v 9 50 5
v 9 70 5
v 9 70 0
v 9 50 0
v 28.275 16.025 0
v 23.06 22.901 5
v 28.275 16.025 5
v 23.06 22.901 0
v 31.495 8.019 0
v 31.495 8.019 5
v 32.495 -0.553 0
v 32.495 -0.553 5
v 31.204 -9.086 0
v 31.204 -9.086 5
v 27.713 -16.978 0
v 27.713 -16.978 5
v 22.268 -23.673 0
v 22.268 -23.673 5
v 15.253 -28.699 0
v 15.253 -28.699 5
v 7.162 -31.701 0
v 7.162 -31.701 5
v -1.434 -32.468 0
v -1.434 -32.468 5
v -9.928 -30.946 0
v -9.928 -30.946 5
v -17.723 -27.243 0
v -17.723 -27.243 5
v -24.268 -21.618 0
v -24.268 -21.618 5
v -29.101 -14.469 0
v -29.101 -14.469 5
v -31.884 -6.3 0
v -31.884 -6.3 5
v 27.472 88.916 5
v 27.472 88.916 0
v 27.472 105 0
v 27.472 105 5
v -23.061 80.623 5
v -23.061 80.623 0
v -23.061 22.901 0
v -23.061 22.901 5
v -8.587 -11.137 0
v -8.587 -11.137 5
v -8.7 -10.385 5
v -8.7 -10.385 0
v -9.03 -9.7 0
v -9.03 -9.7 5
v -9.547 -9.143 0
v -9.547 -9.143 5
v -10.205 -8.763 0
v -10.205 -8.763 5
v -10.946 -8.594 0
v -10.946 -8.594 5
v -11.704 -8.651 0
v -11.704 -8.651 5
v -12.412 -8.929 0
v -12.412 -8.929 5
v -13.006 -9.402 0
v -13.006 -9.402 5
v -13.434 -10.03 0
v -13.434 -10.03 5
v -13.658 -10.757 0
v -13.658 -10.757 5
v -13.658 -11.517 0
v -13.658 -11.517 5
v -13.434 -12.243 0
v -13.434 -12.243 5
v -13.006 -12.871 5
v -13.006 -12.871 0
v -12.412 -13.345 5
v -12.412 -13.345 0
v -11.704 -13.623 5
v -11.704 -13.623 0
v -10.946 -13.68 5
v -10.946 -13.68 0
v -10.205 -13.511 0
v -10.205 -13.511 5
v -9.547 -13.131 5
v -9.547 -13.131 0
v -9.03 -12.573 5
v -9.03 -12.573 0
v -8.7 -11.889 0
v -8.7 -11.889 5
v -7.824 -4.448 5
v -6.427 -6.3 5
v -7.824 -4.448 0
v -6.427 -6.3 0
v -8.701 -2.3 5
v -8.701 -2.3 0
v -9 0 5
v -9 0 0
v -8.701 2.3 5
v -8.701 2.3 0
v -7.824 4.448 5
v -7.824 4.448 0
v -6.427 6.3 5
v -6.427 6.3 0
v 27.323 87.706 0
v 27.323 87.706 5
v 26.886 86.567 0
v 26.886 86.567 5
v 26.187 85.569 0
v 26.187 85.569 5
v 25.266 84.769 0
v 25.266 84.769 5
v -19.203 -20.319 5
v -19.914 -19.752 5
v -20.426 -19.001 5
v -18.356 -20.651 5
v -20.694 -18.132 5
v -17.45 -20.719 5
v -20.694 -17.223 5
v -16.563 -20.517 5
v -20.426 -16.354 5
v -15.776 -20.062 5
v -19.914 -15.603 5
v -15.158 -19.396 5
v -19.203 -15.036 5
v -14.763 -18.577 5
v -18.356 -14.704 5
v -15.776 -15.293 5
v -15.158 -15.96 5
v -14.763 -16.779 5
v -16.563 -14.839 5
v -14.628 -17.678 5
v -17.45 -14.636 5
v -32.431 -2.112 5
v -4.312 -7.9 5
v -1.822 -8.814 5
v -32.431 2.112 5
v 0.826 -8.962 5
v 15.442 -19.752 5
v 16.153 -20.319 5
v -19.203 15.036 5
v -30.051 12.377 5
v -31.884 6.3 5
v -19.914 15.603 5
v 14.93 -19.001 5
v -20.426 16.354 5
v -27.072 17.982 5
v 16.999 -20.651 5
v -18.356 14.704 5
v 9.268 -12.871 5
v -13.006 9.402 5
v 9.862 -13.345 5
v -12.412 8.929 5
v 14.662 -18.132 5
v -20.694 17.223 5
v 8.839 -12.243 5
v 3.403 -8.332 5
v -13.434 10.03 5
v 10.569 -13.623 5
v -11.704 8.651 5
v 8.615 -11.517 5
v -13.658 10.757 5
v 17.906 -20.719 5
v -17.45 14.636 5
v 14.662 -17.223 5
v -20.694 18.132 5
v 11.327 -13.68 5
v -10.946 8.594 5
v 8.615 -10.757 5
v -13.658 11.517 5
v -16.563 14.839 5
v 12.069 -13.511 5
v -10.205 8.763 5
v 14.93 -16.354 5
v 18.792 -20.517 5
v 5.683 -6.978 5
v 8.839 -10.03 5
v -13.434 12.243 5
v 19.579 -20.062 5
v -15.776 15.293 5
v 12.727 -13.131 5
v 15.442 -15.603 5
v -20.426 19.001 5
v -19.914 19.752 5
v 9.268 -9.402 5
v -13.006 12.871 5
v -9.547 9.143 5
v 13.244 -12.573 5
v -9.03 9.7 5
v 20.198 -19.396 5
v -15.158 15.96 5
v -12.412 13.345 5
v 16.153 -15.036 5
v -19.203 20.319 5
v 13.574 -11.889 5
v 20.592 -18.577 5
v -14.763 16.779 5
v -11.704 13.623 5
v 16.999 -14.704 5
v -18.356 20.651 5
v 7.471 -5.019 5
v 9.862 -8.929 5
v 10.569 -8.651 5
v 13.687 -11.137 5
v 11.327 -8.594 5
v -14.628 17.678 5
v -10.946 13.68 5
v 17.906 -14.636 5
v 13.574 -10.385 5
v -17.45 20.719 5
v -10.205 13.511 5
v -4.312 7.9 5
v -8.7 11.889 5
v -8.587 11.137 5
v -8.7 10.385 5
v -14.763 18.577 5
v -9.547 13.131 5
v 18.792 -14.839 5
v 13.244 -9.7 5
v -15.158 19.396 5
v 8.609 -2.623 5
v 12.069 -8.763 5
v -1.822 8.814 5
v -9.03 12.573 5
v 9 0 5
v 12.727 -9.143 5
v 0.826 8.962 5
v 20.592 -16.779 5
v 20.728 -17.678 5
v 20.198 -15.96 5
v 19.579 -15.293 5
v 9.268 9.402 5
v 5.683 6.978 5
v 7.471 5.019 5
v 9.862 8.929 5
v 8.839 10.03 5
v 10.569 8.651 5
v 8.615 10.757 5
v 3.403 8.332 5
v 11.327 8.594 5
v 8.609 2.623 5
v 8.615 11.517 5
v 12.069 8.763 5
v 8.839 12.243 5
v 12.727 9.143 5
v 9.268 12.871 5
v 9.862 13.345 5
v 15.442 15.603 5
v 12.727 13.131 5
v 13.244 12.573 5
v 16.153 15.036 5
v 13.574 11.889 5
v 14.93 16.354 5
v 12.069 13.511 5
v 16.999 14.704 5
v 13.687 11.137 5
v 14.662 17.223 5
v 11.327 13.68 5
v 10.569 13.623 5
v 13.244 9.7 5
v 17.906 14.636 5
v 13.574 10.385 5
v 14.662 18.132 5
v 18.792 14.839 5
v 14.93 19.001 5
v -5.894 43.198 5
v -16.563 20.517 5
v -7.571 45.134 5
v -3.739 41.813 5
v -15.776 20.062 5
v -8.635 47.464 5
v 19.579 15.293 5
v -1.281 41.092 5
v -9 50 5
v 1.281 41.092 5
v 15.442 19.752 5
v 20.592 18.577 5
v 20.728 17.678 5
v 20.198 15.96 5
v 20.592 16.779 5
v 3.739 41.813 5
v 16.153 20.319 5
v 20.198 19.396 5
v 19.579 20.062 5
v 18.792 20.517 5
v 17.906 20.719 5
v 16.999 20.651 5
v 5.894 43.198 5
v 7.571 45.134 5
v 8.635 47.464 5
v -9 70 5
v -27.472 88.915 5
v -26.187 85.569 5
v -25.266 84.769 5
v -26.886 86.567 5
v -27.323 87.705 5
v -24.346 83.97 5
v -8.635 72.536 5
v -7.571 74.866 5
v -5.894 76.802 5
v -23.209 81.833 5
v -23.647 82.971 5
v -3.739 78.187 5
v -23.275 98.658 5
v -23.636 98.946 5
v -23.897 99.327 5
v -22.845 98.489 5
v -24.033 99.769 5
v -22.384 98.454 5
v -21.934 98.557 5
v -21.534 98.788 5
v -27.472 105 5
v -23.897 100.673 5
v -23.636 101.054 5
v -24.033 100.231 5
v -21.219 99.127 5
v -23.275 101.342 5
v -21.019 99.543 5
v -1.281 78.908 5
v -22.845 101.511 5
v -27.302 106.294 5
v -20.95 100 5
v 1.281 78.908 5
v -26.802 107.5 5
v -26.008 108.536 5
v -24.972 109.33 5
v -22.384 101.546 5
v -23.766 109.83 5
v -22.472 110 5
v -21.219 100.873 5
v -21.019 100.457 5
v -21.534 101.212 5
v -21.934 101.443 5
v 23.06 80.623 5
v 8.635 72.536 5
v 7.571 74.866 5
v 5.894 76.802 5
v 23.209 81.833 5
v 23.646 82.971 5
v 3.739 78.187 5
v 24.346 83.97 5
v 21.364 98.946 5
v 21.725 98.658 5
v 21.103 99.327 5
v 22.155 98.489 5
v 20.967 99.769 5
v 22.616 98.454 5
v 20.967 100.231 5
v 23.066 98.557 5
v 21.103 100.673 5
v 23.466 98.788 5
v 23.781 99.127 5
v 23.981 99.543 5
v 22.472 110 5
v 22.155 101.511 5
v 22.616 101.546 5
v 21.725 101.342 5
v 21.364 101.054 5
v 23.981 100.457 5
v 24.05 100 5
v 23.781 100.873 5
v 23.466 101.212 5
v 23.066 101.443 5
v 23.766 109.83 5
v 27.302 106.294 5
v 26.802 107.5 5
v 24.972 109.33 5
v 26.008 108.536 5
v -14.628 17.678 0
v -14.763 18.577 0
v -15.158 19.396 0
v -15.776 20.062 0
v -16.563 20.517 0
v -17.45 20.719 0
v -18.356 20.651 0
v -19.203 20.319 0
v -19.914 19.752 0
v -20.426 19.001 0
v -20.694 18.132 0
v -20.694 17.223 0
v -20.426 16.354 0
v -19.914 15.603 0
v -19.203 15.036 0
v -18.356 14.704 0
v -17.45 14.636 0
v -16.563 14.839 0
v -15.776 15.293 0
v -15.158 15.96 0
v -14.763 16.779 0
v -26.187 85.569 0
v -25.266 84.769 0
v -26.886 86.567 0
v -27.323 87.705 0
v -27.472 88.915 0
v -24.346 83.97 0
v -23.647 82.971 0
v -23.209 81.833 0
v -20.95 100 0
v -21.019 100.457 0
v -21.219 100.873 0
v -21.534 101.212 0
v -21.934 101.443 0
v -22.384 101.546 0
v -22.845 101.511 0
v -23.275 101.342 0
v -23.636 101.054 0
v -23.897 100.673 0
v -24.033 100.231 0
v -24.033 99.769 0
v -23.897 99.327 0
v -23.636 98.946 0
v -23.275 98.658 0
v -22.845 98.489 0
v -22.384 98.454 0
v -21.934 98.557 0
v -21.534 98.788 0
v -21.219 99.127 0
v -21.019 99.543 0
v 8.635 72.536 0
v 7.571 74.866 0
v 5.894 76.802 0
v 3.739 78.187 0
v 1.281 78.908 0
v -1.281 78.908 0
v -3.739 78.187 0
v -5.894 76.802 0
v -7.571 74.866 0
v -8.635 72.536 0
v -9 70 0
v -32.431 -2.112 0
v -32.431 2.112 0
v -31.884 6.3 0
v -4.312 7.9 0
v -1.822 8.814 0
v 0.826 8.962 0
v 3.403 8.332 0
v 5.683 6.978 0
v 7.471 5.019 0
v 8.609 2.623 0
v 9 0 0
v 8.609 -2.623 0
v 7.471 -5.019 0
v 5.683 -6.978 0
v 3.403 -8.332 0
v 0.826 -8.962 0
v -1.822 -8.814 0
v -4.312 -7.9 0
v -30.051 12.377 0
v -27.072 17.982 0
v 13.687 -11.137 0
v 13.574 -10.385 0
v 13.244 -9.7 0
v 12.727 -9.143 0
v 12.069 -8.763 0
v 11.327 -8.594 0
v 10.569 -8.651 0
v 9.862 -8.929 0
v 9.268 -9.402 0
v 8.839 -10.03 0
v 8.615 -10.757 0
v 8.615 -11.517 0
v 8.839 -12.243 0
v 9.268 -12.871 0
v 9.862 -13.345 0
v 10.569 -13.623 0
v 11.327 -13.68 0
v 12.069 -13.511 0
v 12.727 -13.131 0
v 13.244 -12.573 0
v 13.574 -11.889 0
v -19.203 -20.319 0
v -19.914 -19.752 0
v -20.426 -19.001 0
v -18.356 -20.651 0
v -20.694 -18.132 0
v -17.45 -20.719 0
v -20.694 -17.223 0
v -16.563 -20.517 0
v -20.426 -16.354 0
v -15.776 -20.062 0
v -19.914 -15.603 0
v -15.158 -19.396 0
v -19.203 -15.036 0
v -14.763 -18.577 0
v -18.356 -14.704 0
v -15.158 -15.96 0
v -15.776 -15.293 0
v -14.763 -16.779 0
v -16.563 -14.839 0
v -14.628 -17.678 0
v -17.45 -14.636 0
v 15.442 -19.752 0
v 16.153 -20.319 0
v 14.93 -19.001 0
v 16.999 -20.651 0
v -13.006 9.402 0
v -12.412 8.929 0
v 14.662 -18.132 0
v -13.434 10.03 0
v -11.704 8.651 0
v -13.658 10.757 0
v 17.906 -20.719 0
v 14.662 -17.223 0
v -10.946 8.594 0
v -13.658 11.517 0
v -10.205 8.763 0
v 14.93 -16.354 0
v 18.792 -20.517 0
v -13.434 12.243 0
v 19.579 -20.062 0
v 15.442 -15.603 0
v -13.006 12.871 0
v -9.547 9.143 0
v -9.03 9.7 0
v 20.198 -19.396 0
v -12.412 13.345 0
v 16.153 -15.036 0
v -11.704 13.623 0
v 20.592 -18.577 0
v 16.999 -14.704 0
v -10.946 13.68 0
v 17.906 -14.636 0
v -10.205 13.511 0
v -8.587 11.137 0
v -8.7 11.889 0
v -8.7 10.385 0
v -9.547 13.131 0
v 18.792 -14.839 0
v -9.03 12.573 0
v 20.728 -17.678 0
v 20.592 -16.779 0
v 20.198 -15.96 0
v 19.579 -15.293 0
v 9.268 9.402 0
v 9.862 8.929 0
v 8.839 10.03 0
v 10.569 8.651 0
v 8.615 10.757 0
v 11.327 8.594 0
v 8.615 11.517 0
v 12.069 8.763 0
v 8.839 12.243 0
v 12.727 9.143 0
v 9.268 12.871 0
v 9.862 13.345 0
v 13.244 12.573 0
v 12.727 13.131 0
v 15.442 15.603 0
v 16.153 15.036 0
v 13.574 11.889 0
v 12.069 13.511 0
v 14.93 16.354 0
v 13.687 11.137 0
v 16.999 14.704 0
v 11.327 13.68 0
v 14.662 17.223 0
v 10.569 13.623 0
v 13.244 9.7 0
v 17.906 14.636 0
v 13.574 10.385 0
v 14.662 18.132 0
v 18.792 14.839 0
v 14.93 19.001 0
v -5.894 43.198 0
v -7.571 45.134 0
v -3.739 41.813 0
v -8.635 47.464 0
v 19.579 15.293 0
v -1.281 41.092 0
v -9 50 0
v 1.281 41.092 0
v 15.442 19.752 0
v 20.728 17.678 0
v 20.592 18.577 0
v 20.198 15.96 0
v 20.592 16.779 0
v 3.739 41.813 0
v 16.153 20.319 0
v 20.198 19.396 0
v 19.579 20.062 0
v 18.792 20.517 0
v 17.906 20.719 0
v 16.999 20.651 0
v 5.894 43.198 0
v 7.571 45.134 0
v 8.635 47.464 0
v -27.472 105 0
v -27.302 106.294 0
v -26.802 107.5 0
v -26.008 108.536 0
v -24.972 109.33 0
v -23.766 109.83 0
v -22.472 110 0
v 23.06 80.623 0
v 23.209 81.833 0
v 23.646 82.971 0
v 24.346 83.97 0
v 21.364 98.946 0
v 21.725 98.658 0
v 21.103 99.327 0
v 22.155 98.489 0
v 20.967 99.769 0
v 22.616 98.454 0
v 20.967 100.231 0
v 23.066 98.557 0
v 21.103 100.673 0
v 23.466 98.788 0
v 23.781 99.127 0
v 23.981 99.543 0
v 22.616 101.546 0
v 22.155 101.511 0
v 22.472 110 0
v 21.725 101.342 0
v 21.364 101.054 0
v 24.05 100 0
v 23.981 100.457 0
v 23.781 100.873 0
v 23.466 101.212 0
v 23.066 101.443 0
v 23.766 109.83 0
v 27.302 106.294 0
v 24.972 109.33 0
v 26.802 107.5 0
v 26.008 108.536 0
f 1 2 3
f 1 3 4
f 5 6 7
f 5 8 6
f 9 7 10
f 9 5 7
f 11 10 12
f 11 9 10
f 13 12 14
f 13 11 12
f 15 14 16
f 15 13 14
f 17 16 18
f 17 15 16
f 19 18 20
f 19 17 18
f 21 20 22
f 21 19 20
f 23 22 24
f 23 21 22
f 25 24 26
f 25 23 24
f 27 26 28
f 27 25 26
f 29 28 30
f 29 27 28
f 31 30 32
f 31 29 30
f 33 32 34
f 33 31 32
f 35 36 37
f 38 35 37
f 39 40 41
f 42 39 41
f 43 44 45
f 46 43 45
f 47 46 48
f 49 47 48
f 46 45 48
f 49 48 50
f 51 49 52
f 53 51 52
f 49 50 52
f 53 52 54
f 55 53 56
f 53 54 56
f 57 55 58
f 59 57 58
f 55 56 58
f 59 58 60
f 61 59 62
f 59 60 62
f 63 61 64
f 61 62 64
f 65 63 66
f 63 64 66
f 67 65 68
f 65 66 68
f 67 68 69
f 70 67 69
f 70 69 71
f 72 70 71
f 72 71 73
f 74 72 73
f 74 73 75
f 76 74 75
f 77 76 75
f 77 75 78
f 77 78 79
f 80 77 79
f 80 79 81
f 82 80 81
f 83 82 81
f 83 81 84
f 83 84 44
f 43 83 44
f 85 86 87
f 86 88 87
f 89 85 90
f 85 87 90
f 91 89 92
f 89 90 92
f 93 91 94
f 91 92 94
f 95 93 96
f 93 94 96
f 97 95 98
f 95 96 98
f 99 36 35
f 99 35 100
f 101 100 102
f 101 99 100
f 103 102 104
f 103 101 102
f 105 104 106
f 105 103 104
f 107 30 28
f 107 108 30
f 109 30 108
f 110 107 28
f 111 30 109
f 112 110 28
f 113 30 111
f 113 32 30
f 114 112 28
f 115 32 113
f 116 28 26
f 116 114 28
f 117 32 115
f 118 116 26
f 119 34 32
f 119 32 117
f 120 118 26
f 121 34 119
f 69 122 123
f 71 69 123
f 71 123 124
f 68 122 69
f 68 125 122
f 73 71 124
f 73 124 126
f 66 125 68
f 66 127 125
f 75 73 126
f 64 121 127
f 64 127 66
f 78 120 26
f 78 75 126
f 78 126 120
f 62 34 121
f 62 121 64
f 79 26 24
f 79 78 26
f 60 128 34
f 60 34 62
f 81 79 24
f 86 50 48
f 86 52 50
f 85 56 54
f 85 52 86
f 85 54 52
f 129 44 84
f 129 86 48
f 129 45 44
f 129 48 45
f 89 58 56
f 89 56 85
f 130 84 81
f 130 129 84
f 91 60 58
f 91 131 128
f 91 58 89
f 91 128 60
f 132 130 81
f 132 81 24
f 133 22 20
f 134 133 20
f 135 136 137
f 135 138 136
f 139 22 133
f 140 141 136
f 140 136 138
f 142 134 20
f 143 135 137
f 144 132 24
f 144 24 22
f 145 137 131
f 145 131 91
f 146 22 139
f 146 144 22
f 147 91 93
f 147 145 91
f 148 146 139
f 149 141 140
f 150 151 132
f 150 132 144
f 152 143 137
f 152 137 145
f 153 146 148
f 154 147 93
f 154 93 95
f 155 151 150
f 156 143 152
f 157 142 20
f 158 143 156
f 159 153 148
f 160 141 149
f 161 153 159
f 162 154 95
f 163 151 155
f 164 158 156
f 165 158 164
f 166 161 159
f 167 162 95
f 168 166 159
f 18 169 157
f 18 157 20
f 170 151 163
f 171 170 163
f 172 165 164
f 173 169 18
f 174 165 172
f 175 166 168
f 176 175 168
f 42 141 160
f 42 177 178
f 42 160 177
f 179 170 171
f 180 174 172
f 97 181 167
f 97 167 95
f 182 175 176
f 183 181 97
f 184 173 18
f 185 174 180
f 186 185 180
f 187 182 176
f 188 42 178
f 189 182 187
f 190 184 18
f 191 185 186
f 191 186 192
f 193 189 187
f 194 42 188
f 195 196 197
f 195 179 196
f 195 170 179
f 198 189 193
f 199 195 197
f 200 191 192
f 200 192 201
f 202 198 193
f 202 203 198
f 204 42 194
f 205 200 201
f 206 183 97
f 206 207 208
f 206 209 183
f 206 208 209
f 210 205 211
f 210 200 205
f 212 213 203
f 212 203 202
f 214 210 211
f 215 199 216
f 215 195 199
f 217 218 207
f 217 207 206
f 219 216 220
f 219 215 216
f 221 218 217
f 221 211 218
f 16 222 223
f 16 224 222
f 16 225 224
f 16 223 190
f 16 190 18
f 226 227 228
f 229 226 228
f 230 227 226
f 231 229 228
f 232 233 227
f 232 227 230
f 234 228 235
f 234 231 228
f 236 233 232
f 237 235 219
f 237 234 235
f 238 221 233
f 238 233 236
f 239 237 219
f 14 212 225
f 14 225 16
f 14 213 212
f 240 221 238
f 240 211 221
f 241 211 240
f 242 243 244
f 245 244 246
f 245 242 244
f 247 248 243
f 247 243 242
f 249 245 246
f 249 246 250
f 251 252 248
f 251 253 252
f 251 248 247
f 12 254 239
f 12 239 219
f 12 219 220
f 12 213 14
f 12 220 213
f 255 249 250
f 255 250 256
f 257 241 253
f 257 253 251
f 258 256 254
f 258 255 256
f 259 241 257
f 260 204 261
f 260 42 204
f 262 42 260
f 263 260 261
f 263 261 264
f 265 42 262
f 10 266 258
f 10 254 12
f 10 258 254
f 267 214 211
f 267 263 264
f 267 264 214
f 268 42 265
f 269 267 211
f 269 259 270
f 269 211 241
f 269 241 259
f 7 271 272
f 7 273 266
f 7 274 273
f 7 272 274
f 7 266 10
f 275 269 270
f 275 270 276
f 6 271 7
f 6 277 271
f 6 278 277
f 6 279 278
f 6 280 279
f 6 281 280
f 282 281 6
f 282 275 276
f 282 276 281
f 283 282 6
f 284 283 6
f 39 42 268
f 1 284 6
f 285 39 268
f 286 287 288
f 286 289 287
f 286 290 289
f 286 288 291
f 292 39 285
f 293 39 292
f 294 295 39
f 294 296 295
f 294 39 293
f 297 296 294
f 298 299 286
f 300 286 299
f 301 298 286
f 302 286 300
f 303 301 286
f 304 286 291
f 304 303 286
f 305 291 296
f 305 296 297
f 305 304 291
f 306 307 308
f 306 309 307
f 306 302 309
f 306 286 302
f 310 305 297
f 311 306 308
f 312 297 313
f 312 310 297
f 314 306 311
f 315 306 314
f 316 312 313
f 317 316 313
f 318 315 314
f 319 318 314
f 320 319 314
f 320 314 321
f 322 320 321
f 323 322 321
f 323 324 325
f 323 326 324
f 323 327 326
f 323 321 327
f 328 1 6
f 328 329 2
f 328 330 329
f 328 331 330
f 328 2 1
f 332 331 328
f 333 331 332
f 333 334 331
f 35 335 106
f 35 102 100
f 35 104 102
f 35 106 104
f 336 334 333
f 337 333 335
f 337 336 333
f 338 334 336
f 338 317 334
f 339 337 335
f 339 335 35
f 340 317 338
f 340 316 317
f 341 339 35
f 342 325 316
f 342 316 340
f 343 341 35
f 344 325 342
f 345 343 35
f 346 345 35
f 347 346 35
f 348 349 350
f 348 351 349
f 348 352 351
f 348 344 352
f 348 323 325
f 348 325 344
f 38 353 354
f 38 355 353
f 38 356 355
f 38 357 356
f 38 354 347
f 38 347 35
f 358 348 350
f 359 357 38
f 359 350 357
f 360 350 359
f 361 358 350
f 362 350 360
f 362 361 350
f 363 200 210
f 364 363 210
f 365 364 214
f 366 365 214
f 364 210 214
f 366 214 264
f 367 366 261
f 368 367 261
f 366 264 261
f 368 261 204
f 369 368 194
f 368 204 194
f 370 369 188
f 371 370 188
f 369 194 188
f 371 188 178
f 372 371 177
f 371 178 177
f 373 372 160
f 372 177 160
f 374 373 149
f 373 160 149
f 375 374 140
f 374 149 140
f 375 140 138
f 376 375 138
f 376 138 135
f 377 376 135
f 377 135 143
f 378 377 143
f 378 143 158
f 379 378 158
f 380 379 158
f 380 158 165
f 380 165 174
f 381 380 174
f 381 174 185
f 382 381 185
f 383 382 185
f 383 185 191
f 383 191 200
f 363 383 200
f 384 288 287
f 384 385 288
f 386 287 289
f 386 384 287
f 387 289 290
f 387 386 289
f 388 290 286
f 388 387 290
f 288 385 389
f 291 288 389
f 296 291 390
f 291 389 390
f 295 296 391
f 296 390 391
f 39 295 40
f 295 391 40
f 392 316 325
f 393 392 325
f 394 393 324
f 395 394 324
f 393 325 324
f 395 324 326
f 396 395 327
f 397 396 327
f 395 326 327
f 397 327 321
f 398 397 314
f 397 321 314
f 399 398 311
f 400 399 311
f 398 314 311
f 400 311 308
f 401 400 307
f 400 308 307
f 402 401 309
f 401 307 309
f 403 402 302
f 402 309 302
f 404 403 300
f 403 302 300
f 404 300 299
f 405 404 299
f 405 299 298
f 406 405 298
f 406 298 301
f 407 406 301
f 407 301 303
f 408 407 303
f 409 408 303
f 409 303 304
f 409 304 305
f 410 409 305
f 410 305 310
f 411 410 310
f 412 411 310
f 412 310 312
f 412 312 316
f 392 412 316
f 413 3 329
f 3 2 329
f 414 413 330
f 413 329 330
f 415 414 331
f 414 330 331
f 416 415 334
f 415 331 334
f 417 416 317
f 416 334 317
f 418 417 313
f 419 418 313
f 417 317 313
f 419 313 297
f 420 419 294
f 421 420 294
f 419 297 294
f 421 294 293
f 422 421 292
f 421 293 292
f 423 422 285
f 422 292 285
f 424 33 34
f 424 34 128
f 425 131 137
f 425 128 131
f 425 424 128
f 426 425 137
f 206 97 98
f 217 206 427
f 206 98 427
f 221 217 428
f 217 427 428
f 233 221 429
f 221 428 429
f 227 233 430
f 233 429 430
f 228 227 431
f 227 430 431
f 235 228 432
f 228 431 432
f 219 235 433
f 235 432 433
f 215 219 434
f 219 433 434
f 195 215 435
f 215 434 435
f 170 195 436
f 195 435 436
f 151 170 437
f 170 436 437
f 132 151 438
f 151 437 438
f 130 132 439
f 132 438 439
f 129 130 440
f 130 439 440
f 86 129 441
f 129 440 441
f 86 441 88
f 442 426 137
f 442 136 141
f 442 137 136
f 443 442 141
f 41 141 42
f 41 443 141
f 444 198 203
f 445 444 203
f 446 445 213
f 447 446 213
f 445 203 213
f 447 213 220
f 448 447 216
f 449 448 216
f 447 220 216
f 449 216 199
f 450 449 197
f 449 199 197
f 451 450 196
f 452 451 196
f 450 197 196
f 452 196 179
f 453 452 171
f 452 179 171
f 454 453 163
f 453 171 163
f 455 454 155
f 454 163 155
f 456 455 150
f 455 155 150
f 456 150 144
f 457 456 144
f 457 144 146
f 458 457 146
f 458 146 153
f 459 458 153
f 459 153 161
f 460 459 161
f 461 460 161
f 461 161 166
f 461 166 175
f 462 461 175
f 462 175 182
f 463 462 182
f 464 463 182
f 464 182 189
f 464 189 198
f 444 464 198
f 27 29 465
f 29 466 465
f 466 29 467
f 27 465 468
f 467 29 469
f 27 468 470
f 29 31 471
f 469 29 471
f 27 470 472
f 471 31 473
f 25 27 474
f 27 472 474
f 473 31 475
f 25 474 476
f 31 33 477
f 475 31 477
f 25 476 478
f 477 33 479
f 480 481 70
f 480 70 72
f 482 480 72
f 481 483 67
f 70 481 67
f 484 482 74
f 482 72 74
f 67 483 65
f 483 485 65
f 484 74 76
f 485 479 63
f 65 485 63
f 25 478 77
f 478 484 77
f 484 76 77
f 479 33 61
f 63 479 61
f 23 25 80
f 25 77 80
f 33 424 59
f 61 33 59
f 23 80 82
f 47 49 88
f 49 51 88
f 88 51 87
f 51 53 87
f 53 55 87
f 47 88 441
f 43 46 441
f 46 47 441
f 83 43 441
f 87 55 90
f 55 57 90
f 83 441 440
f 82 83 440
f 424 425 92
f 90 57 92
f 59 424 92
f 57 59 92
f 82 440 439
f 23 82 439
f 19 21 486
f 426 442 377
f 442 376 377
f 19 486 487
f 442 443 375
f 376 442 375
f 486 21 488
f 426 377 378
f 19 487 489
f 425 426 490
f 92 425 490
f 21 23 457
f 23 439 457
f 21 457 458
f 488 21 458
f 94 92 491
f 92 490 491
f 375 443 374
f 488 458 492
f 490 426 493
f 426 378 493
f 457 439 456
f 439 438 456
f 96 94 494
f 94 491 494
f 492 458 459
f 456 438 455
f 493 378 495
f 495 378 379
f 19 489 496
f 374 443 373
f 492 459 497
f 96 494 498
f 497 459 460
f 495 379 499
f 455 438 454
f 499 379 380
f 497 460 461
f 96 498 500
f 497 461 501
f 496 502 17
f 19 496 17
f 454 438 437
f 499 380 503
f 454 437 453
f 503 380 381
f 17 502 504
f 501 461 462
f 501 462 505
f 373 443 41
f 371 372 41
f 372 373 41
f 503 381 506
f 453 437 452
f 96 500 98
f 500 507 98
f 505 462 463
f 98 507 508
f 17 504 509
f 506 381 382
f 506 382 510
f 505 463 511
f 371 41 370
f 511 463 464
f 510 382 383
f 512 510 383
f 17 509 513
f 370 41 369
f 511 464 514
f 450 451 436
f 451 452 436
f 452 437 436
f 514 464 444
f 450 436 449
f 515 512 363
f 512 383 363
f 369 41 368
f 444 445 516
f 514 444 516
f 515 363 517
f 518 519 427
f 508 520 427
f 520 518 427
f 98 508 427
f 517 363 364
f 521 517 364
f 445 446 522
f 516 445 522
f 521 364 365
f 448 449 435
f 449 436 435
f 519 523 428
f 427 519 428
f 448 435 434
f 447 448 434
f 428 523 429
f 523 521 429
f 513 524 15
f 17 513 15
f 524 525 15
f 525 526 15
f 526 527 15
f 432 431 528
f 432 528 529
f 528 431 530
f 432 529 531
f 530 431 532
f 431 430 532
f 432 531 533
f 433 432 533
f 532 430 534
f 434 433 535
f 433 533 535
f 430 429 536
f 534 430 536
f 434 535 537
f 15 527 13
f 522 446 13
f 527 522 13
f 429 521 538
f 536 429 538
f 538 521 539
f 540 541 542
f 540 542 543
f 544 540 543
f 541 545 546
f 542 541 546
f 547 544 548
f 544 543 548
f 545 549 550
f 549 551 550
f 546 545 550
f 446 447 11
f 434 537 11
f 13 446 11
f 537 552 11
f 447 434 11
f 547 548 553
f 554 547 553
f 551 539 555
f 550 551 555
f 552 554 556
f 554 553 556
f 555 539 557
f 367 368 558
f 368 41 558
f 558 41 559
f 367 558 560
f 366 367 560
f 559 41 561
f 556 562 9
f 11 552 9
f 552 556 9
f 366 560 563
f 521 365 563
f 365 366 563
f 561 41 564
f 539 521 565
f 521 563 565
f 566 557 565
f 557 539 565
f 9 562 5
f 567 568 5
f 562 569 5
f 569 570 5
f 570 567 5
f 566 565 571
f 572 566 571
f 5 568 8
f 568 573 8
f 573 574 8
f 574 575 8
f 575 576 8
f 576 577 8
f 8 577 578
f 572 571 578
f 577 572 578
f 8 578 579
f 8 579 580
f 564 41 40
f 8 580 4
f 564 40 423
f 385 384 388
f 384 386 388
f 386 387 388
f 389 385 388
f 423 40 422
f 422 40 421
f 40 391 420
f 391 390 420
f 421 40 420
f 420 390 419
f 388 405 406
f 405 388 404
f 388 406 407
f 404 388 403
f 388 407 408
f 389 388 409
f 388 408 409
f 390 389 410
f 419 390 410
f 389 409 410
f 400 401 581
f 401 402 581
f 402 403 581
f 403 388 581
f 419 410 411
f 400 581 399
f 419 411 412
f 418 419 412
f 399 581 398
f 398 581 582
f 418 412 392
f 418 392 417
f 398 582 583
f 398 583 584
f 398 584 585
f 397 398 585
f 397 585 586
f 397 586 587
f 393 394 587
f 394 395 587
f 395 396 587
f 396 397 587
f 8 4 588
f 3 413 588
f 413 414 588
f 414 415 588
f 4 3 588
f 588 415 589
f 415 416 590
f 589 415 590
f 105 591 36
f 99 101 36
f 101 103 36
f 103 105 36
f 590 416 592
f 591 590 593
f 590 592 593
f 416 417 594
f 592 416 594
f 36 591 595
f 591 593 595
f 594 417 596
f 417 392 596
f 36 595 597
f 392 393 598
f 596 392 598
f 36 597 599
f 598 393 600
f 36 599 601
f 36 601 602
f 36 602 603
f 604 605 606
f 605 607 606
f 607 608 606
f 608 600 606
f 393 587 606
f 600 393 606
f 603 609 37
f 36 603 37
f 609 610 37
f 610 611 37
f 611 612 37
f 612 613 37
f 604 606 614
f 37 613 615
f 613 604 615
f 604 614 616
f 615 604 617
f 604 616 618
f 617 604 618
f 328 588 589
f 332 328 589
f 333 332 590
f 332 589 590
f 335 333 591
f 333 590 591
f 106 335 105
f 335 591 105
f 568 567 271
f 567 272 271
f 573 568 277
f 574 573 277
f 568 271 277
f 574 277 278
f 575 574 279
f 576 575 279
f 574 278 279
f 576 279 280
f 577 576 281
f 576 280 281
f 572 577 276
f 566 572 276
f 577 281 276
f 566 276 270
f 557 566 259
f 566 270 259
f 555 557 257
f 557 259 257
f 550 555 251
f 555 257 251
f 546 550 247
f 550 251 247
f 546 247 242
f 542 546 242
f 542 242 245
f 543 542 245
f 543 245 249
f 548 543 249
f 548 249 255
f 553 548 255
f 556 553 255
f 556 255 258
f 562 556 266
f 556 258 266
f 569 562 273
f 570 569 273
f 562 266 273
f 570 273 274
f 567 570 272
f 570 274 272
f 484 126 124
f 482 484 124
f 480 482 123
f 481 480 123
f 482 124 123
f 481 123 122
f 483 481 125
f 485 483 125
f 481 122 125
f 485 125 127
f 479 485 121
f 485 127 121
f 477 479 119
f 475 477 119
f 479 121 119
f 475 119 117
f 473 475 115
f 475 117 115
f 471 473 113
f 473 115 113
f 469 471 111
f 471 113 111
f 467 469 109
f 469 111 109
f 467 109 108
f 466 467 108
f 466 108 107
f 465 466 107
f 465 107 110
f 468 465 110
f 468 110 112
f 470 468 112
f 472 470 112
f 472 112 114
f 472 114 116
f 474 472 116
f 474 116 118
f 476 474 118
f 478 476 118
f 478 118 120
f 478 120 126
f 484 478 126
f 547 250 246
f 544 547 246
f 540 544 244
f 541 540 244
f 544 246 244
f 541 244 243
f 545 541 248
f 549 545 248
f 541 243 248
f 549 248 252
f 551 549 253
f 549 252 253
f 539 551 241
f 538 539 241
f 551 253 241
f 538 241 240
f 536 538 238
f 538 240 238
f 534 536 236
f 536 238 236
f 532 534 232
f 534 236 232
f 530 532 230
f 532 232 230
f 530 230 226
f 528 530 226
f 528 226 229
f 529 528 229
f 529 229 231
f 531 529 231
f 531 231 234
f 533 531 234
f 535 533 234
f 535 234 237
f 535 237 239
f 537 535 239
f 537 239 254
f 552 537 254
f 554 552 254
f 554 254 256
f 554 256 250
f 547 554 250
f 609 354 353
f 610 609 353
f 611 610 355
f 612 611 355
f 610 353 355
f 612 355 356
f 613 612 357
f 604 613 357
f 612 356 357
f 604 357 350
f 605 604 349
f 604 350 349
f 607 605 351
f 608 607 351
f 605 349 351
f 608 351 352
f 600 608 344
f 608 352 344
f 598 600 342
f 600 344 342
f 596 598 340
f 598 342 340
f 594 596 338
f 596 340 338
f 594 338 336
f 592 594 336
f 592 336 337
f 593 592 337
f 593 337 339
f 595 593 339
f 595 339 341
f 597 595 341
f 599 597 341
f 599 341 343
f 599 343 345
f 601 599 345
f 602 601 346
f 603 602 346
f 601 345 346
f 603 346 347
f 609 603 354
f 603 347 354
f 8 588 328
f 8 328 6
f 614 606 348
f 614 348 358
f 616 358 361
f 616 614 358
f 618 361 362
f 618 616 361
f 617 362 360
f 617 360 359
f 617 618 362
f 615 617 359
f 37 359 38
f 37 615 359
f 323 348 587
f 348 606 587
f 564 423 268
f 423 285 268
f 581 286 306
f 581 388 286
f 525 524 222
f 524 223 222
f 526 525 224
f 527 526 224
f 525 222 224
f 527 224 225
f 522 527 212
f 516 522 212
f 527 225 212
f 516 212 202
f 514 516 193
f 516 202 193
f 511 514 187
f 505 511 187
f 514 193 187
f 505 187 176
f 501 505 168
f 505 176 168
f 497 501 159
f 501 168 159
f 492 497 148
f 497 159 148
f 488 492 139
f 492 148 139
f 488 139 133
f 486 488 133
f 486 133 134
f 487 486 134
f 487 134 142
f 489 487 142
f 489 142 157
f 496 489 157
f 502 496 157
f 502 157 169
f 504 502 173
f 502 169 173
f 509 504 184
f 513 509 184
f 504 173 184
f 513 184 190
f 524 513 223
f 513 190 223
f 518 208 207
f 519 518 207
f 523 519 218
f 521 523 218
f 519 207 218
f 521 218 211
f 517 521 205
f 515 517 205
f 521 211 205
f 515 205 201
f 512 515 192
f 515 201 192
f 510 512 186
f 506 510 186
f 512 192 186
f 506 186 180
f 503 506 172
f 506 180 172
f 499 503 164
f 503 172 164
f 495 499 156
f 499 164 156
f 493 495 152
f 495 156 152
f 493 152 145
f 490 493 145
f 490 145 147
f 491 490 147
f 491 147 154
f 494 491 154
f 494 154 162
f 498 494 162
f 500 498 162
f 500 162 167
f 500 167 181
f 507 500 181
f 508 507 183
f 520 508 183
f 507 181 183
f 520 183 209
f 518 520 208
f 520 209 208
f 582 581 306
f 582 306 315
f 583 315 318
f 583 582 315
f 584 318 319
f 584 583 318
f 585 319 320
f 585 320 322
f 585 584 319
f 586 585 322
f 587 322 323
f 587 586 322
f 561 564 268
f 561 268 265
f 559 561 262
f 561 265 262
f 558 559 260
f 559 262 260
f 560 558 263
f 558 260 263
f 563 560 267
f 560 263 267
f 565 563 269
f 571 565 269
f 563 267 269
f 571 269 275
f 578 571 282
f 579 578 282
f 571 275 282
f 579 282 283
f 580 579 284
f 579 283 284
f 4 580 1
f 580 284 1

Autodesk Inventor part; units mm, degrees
ref_plane "YZ Plane" through (0, 0, 0) normal (1, 0, 0) x (0, 1, 0)
ref_plane "XZ Plane" through (0, 0, 0) normal (0, 1, 0) x (-1, 0, 0)
ref_plane "XY Plane" through (0, 0, 0) normal (0, 0, 1) x (1, 0, 0)
sketch "Sketch1" plane through (0, 0, 0) normal (0, 0, 1) x (1, 0, 0)
  circle A0 centre (17.6777, -17.6777) radius 3
  circle A1 centre (-17.6777, -17.6777) radius 3
  circle A2 centre (-17.6777, 17.6777) radius 3
  circle A3 centre (17.6777, 17.6777) radius 3
  circle A4 centre (-11.1369, -11.1369) radius 2.5
  circle A5 centre (11.1369, -11.1369) radius 2.5
  circle A6 centre (-11.1369, 11.1369) radius 2.5
  circle A7 centre (11.1369, 11.1369) radius 2.5
  arc A8 (-6.4273, -6.3) -> (-6.4273, 6.3) centre (0, 0) ccw
  arc A9 (-31.8835, -6.3) -> (-31.8835, 6.3) centre (0, 0) ccw
  circle A10 centre (0, 0) radius 32.5
  circle A11 centre (0, 0) radius 9
  line L0 (22.4721, 110) -> (-22.4721, 110)
  line L1 (-27.4721, 105) -> (-27.4721, 90)
  line L2 (-23.0608, 85.5886) -> (-23.0608, 31.884)
  line L3 (23.0603, 31.884) -> (23.0603, 85.5881)
  line L4 (27.4721, 90) -> (27.4721, 105)
  circle A12 centre (22.5, 100) radius 1.5
  circle A13 centre (-22.5, 100) radius 1.5
  circle A14 centre (11.1369, -11.1369) radius 2.5
  circle A15 centre (11.1369, 11.1369) radius 2.5
  circle A16 centre (-11.1369, 11.1369) radius 2.5
  circle A17 centre (-11.1369, -11.1369) radius 2.5
  line L5 (27.4721, 105) -> (27.4721, 110)
  line L6 (27.4721, 110) -> (-27.4721, 110)
  line L7 (-27.4721, 110) -> (-27.4721, 105)
  line L8 (27.4721, 90) -> (27.4721, 85.5881)
  line L9 (27.4721, 85.5881) -> (-27.4721, 85.5881)
  line L10 (-27.4721, 85.5881) -> (-27.4721, 90)
  line L11 (-23.0608, 31.884) -> (-23.0608, 22.9009)
  line L12 (23.0603, 31.884) -> (23.0603, 22.9014)
  point P0 (-31.8835, 6.3)
  point P1 (-23.0608, 85.5881)
  point P2 (-6.4273, 6.3)
extrude "Extrusion1" add sketch "Sketch1" along normal blind 5
fillet "Fillet1" radius 5 6 edges at (-27.4721, 110, 2.5) (27.4721, 110, 2.5) (-27.4721, 85.5881, 2.5) (-23.0608, 85.5881, 2.5) (27.4721, 85.5881, 2.5) (23.0603, 85.5881, 2.5)
sketch "Sketch2" plane through (0, 0, 5) normal (0, 0, 1) x (1, 0, 0)
  circle A0 centre (-22.5, 100) radius 1.5 projected
  arc A1 (9, 70) -> (-9, 70) centre (0, 70) ccw
  line L0 (-9, 70) -> (-9, 50)
  line L1 (9, 70) -> (9, 50)
  line L2 (0, 40) -> (0, 50)
  arc A2 (-9, 50) -> (9, 50) centre (0, 50) ccw
  point P0 (0, 0)
  dimension "d9" = 18
  dimension "d12" = 10
  dimension "d13" = 18
extrude "Extrusion2" cut sketch "Sketch2" against normal blind 10 contours L1 A2 L0 A1
sketch "Sketch3" plane through (0, 0, 5) normal (0, 0, 1) x (1, 0, 0)
  circle A0 centre (-22.5, 100) radius 1.5 projected
  circle A1 centre (-22.5, 100) radius 1.55
  circle A2 centre (22.5, 100) radius 1.5 projected
  circle A3 centre (22.5, 100) radius 1.55
  circle A4 centre (-17.6777, 17.6777) radius 3 projected
  circle A5 centre (-17.6777, 17.6777) radius 3.05
  circle A6 centre (17.6777, 17.6777) radius 3 projected
  circle A7 centre (17.6777, 17.6777) radius 3.05
  circle A8 centre (11.1369, 11.1369) radius 2.5 projected
  circle A9 centre (11.1369, 11.1369) radius 2.55
  circle A10 centre (-11.1369, 11.1369) radius 2.5 projected
  circle A11 centre (-11.1369, 11.1369) radius 2.55
  circle A12 centre (-11.1369, -11.1369) radius 2.5 projected
  circle A13 centre (-11.1369, -11.1369) radius 2.55
  circle A14 centre (11.1369, -11.1369) radius 2.5 projected
  circle A15 centre (11.1369, -11.1369) radius 2.55
  circle A16 centre (-17.6777, -17.6777) radius 3 projected
  circle A17 centre (-17.6777, -17.6777) radius 3.05
  circle A18 centre (17.6777, -17.6777) radius 3 projected
  circle A19 centre (17.6777, -17.6777) radius 3.05
  point P0 (0, 0)
  dimension "d14" = 3.1
  dimension "d15" = 3.1
  dimension "d16" = 6.1
  dimension "d17" = 6.1
  dimension "d18" = 5.1
  dimension "d19" = 5.1
  dimension "d20" = 5.1
  dimension "d21" = 5.1
  dimension "d22" = 6.1
  dimension "d23" = 6.1
extrude "Extrusion3" cut sketch "Sketch3" against normal blind 10 contours A0 | A1 | A2 | A3 | A4 | A5 | A6 | A7 | A8 | A9 | A10 | A11 | A12 | A13 | A14 | A15 | A16 | A17 | A18 | A19
properties part number "Part2_Camera"
